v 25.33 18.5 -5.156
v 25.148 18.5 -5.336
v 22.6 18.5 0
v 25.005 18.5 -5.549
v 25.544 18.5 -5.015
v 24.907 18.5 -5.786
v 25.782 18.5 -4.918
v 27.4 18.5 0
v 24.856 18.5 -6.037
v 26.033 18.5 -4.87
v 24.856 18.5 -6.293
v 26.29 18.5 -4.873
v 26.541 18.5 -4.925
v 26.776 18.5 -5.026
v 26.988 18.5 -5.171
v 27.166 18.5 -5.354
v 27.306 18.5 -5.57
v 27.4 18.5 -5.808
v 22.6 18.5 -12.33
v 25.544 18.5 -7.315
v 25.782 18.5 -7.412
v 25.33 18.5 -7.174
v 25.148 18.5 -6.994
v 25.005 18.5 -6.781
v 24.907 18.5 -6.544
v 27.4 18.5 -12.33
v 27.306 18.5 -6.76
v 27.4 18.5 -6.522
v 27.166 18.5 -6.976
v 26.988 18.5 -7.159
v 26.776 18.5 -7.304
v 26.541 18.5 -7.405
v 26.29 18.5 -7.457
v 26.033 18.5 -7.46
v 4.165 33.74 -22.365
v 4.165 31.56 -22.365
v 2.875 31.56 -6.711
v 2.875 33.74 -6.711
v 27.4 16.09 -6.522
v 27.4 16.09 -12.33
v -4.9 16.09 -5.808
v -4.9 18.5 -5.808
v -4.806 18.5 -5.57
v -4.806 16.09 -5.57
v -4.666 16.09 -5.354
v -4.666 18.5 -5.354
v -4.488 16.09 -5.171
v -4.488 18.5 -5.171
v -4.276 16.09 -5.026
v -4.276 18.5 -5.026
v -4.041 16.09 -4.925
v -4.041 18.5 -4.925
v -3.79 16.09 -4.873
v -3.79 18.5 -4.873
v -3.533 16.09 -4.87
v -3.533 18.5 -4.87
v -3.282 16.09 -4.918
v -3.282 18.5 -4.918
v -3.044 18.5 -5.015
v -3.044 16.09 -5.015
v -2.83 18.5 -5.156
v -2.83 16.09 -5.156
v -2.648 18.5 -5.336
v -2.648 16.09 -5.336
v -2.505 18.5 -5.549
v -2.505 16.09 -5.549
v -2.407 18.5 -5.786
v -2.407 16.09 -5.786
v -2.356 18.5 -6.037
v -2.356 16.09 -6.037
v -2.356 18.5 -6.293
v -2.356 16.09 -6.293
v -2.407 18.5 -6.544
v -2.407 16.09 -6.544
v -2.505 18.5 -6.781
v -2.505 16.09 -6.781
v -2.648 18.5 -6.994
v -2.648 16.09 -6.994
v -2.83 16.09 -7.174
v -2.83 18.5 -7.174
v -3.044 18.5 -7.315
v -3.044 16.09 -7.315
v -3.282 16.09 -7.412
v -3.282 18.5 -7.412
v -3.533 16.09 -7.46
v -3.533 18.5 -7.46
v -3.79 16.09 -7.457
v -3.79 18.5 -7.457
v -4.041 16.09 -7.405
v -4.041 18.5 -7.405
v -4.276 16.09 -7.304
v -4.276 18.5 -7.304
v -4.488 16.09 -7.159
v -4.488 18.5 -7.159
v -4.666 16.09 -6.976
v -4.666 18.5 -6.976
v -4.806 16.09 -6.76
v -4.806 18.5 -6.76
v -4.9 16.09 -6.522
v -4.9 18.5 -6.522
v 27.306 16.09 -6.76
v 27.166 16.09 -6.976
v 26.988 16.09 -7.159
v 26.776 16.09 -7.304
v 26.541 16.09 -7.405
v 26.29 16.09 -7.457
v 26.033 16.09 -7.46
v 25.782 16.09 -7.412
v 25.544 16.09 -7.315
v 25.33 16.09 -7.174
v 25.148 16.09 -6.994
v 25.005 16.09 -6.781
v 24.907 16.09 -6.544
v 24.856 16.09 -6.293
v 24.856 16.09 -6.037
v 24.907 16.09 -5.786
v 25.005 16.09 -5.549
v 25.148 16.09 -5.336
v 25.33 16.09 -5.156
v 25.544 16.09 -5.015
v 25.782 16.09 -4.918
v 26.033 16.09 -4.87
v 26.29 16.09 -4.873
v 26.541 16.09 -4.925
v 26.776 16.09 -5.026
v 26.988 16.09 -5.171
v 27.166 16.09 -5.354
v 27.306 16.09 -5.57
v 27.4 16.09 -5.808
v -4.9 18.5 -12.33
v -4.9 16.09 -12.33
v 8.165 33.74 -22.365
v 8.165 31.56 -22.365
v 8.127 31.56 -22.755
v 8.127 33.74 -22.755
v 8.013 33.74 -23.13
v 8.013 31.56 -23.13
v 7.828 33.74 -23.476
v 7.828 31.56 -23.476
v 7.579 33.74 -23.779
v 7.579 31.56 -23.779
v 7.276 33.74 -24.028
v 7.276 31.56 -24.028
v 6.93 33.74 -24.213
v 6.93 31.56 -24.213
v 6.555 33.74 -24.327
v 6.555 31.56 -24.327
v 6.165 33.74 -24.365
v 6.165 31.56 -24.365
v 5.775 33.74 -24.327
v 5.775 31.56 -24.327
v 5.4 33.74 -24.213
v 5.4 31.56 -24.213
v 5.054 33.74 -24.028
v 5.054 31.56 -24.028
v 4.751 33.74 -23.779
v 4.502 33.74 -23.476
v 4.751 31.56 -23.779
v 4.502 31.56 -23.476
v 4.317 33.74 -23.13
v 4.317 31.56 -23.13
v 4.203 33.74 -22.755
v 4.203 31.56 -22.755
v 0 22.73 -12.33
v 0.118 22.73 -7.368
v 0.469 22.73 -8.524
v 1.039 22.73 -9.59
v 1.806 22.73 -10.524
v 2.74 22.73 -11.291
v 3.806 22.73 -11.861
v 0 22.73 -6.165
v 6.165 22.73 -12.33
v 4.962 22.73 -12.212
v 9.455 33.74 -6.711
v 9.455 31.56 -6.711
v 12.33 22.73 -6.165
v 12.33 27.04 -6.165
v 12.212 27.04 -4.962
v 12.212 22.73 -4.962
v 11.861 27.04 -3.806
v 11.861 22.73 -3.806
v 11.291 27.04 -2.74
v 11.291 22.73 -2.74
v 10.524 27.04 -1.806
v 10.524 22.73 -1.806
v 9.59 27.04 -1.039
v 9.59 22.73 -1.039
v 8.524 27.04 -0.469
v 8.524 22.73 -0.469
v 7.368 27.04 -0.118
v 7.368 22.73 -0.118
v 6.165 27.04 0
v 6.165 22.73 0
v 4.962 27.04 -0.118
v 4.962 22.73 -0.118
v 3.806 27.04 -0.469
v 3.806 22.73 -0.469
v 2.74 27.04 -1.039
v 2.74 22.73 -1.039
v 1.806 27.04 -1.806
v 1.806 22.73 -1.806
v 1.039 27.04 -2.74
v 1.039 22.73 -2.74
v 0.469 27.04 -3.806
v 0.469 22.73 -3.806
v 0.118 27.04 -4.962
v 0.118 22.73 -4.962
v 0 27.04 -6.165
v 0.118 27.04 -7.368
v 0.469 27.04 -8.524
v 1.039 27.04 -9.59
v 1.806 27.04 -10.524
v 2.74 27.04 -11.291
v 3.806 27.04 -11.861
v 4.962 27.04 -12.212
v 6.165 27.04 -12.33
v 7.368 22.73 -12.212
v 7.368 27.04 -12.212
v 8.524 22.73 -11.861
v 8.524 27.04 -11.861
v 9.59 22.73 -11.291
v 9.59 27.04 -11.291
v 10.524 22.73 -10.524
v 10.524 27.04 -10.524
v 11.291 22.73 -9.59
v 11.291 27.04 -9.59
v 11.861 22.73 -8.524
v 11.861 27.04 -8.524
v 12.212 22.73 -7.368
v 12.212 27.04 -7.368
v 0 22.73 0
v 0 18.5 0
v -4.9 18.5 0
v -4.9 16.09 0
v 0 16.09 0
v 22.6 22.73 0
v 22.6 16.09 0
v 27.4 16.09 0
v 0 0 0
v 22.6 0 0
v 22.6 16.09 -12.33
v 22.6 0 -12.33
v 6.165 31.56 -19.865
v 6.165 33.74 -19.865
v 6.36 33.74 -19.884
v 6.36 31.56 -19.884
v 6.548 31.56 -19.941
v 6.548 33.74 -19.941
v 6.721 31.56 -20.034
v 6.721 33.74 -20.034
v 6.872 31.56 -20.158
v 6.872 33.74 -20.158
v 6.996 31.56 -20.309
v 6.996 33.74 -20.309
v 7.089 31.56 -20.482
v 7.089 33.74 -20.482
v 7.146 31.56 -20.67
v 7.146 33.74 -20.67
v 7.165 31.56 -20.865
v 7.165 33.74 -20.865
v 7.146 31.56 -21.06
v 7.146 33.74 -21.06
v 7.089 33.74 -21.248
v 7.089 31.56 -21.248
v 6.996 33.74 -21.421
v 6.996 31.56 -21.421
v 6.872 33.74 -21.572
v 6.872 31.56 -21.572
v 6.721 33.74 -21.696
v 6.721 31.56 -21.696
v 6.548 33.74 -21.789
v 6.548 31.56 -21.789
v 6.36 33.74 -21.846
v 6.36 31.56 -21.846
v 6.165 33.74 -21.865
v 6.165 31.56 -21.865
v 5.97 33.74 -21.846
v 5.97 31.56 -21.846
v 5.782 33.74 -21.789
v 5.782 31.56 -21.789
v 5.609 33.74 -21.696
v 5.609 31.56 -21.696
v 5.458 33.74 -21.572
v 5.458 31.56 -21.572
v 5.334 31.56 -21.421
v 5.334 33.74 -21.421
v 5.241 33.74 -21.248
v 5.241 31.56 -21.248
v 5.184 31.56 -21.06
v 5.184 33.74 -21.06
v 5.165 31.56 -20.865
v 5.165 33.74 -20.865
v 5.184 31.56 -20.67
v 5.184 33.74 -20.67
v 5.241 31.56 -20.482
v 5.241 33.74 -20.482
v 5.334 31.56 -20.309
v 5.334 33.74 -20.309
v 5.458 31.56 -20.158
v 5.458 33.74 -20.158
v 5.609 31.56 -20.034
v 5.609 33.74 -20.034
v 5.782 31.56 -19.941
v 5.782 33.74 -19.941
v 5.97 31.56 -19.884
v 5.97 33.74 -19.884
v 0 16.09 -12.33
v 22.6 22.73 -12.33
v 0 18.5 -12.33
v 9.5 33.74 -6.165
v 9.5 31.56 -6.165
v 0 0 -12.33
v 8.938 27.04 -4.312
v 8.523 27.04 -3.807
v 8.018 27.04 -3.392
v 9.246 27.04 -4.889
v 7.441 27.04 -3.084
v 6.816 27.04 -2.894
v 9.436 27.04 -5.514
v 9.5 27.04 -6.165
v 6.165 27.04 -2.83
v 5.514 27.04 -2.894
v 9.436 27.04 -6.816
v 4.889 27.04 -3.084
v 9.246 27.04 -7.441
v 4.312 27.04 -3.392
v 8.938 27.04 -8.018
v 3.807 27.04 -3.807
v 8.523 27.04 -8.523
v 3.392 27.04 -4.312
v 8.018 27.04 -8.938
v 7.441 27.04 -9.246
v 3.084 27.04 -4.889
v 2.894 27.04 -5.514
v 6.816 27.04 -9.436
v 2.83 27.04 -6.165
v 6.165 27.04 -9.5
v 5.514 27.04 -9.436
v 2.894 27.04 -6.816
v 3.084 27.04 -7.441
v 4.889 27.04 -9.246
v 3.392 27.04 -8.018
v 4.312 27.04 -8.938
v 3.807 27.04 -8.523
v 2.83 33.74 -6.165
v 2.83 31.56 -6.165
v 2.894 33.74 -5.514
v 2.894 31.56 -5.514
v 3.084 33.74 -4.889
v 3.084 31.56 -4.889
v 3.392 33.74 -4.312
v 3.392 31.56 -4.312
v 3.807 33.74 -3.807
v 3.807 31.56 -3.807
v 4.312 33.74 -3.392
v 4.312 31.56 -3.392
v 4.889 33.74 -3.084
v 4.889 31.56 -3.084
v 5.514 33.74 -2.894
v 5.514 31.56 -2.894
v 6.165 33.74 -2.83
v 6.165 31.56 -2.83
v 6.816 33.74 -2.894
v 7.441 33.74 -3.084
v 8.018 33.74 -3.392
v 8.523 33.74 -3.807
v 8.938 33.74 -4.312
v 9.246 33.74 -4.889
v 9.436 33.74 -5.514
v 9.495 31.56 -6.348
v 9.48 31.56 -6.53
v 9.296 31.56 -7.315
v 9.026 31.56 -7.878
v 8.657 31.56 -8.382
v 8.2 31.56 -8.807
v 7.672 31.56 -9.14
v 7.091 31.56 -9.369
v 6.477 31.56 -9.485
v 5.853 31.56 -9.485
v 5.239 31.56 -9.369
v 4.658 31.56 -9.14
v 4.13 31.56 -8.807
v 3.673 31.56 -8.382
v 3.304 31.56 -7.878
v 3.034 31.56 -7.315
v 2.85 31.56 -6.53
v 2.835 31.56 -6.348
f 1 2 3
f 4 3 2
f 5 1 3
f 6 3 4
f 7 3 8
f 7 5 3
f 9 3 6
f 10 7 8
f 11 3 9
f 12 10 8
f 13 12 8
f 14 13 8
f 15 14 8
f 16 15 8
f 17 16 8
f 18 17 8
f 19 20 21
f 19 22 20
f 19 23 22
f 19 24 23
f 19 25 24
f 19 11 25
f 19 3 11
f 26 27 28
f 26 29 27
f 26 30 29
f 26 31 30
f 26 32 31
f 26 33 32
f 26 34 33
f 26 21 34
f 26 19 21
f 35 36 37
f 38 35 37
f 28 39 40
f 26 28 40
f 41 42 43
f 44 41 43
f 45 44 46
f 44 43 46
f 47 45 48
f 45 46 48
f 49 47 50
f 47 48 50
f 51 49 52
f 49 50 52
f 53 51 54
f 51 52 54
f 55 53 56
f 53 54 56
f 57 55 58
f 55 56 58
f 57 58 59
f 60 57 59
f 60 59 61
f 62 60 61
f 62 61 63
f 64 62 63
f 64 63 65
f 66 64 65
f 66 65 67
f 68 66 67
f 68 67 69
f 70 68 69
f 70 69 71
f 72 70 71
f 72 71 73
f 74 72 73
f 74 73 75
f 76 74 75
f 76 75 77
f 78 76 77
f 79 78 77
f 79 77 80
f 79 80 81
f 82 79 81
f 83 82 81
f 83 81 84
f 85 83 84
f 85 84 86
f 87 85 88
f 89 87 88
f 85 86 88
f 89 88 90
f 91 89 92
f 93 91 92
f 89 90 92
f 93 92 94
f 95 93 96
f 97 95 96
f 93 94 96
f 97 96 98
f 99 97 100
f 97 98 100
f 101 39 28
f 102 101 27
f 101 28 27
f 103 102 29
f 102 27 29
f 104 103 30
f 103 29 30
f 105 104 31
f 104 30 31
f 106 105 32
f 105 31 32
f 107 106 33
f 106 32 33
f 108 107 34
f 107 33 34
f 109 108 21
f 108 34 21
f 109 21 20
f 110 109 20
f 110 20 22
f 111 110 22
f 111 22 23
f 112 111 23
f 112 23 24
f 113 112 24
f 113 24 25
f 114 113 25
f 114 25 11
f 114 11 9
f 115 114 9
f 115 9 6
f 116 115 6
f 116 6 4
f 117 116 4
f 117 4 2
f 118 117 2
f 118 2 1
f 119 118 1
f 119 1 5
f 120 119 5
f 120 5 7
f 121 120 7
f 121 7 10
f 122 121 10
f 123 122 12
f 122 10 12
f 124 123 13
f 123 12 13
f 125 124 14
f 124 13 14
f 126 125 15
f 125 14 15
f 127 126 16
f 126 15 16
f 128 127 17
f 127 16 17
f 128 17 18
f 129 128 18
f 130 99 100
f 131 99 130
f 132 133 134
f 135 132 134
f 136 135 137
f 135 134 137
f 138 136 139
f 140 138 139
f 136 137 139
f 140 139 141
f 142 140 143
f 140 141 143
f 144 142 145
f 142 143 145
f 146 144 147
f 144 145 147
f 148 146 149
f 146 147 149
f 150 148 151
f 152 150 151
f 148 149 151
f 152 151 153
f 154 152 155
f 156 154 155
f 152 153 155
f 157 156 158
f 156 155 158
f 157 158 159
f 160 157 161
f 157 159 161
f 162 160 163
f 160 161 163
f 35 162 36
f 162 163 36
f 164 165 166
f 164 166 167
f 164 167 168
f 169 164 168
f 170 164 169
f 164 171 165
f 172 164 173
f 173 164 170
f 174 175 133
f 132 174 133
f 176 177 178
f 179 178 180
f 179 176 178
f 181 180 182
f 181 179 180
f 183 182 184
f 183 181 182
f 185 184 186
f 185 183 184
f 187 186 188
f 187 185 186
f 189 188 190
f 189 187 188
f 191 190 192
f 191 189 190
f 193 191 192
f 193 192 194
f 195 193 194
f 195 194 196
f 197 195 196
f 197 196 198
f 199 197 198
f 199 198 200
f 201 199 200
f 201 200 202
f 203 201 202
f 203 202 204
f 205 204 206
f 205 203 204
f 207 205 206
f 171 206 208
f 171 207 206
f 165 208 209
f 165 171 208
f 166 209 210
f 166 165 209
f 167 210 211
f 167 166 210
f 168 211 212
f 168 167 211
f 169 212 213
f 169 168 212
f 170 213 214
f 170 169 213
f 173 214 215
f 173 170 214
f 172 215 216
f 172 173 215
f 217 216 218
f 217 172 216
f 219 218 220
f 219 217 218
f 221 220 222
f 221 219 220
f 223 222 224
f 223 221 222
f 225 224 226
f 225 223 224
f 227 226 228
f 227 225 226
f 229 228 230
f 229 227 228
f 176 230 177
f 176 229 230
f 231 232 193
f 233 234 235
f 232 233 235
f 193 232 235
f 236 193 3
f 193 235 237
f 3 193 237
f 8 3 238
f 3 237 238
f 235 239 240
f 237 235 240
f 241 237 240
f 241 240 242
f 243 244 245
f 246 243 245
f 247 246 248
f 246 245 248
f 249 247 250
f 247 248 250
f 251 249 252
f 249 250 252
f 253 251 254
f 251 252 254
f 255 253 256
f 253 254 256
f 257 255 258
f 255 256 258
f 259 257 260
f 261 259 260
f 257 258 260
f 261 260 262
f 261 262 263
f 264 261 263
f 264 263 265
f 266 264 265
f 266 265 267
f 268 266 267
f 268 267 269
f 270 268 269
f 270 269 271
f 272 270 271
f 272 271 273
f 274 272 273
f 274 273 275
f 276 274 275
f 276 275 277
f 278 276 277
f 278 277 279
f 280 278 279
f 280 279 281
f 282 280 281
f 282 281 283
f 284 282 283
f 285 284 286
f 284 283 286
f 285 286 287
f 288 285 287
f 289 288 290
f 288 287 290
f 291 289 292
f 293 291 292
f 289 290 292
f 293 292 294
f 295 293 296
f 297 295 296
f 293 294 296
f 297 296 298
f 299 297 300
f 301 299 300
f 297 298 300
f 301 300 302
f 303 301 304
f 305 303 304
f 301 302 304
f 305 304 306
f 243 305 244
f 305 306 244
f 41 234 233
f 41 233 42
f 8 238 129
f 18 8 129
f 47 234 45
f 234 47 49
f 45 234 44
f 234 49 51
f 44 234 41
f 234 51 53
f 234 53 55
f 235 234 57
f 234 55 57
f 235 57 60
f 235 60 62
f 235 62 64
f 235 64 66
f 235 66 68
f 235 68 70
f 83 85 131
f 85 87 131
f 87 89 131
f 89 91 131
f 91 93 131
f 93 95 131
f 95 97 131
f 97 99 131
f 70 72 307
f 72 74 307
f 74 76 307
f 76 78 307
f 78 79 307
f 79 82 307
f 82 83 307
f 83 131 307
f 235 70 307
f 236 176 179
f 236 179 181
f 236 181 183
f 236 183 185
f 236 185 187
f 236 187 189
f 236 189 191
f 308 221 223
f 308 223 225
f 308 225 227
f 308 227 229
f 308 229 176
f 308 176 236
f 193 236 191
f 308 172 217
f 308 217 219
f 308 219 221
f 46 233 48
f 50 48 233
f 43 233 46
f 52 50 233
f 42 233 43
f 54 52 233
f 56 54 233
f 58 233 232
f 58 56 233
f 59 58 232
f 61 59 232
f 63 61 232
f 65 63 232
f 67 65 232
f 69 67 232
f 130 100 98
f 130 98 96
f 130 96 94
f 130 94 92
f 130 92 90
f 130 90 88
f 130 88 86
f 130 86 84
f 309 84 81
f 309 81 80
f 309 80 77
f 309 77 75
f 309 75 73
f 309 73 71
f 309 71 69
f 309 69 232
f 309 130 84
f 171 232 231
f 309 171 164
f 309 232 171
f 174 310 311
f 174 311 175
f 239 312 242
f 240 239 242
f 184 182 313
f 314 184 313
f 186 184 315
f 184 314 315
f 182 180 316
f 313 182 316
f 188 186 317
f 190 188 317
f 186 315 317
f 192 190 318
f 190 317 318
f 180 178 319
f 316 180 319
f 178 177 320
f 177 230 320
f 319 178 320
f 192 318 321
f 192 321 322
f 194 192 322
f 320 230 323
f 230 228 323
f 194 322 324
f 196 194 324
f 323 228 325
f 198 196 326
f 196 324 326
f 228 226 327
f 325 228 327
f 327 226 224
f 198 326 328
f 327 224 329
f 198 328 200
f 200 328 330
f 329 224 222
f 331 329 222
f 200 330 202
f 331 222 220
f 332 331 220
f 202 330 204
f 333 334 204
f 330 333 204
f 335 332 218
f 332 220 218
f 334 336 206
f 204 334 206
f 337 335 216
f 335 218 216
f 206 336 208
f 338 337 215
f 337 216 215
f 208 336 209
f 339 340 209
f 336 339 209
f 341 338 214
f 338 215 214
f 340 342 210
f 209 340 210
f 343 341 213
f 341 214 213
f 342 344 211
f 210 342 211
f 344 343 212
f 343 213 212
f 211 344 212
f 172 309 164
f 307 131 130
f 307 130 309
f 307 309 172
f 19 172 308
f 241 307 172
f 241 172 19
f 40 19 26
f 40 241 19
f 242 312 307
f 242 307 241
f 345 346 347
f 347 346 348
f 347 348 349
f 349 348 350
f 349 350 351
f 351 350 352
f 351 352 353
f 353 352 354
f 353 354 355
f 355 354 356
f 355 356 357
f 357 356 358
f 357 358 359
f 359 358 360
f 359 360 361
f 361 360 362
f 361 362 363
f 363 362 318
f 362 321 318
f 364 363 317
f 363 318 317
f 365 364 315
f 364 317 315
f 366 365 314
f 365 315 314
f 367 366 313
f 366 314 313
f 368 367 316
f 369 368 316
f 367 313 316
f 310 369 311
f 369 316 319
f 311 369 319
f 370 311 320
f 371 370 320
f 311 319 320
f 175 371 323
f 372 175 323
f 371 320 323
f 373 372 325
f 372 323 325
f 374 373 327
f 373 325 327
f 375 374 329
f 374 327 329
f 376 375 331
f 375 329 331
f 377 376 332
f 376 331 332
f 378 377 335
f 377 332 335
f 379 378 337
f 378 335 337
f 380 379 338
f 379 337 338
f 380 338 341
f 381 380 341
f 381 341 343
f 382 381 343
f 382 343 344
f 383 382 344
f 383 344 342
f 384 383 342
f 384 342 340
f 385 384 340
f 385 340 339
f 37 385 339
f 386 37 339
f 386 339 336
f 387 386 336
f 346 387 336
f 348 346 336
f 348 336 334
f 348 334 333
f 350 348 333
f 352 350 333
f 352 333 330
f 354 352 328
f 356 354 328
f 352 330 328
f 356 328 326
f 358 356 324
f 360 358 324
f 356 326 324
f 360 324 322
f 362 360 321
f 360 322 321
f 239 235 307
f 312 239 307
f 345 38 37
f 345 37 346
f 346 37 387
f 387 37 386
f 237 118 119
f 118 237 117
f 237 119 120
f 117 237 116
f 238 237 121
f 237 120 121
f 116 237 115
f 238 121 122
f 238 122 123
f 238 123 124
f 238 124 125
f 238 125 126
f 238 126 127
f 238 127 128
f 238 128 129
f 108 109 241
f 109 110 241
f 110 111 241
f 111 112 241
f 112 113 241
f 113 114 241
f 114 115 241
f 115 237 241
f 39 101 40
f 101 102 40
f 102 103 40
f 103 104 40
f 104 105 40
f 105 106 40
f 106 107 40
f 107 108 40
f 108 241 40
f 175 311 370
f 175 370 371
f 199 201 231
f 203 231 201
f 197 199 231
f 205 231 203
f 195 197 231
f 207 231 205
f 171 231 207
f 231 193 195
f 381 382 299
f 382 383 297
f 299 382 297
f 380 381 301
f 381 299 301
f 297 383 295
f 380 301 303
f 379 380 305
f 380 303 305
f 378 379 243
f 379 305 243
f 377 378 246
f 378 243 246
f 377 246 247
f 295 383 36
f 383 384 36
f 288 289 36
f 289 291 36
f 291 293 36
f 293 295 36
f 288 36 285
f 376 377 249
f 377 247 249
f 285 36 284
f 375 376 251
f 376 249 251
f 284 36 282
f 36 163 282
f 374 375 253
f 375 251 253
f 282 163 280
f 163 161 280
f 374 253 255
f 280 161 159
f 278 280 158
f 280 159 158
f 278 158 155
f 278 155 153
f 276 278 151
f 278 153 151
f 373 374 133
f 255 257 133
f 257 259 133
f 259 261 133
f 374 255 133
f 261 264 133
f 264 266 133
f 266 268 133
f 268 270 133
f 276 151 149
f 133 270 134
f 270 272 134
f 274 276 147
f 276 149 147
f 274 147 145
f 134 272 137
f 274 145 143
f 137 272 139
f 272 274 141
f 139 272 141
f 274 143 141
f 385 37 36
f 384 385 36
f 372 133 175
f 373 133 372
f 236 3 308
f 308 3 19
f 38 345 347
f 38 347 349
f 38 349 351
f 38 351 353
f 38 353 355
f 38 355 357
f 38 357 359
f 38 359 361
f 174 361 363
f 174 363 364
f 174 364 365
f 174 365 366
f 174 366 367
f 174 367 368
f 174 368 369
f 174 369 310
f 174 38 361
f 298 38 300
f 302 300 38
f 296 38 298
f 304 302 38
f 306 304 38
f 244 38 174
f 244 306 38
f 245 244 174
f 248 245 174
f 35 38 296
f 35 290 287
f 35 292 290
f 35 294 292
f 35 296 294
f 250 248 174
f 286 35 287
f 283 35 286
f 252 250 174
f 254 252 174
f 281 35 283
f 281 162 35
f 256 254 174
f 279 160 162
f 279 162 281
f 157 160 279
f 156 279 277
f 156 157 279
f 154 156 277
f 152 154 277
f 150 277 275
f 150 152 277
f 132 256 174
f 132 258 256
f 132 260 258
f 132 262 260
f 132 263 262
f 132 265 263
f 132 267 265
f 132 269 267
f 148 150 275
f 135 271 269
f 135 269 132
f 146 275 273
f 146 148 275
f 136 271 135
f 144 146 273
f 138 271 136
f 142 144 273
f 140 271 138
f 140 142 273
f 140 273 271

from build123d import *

# Parameters (mm, degrees)
SKETCH1_W           = 22.6
SKETCH1_H           = 12.33
BOSS_EXTRUDE1_DEPTH = 16.09
SKETCH2_W           = 32.3
SKETCH2_H           = 12.33
BOSS_EXTRUDE2_DEPTH = 2.41
SKETCH3_W           = 22.6
SKETCH3_H           = 12.33
BOSS_EXTRUDE3_DEPTH = 4.23
BOSS_EXTRUDE4_DEPTH = 4.31
SKETCH5_R           = 3.335
BOSS_EXTRUDE5_DEPTH = 4.52
BOSS_EXTRUDE8_DEPTH = 2.18
SKETCH8_R           = 1.3
CUT_EXTRUDE3_DEPTH  = 4
SKETCH9_R           = 1.3
CUT_EXTRUDE4_DEPTH  = 4
SKETCH10_R          = 1
CUT_EXTRUDE5_DEPTH  = 10


with BuildPart() as part:
    # Sketch1 → Boss-Extrude1 (new body)
    with BuildSketch(Plane(origin=(0, 0, 0), x_dir=(1, 0, 0), z_dir=(0, 1, 0))):
        with Locations((11.3, 6.165)):
            Rectangle(SKETCH1_W, SKETCH1_H)
    extrude(amount=BOSS_EXTRUDE1_DEPTH)

    # Sketch2 → Boss-Extrude2 (add)
    with BuildSketch(Plane(origin=(0, 16.09, 0), x_dir=(1, 0, 0), z_dir=(0, 1, 0))):
        with Locations((11.25, 6.165)):
            Rectangle(SKETCH2_W, SKETCH2_H)
    extrude(amount=BOSS_EXTRUDE2_DEPTH)

    # Sketch3 → Boss-Extrude3 (add)
    with BuildSketch(Plane(origin=(0, 18.5, 0), x_dir=(1, 0, 0), z_dir=(0, 1, 0))):
        with Locations((11.3, 6.165)):
            Rectangle(SKETCH3_W, SKETCH3_H)
    extrude(amount=BOSS_EXTRUDE3_DEPTH)

    # Sketch4 → Boss-Extrude4 (add)
    with BuildSketch(Plane(origin=(0, 22.73, 0), x_dir=(1, 0, 0), z_dir=(0, 1, 0))):
        with BuildLine():
            ThreePointArc((0, 6.165), (6.165, 12.33), (12.33, 6.165))
            ThreePointArc((12.33, 6.165), (6.165, 0), (0, 6.165))
        make_face()
    extrude(amount=BOSS_EXTRUDE4_DEPTH)

    # Sketch5 → Boss-Extrude5 (add)
    with BuildSketch(Plane(origin=(0, 27.04, 0), x_dir=(1, 0, 0), z_dir=(0, 1, 0))):
        with Locations(Location((6.165, 6.165, 0), (0, 0, 270))):
            Circle(SKETCH5_R)
    extrude(amount=BOSS_EXTRUDE5_DEPTH)

    # Sketch6 → Boss-Extrude8 (add)
    with BuildSketch(Plane(origin=(0, 31.56, 0), x_dir=(1, 0, 0), z_dir=(0, 1, 0))):
        with BuildLine():
            ThreePointArc((9.455009686, 6.710949872), (6.165, 9.5), (2.874990314, 6.710949872))
            Line((2.874990314, 6.710949872), (2.83, 6.165))
            ThreePointArc((2.83, 6.165), (6.165, 2.83), (9.5, 6.165))
            Line((9.5, 6.165), (9.455009686, 6.710949872))
        make_face()
        with BuildLine():
            ThreePointArc((8.165, 22.365), (6.165, 24.365), (4.165, 22.365))
            Line((4.165, 22.365), (2.874990314, 6.710949872))
            ThreePointArc((2.874990314, 6.710949872), (6.165, 9.5), (9.455009686, 6.710949872))
            Line((9.455009686, 6.710949872), (8.165, 22.365))
        make_face()
    extrude(amount=BOSS_EXTRUDE8_DEPTH)

    # Sketch8 → Cut-Extrude3 (cut)
    with BuildSketch(Plane(origin=(0, 18.5, 0), x_dir=(1, 0, 0), z_dir=(0, 1, 0))):
        with Locations((-3.65, 6.165)):
            Circle(SKETCH8_R)
    extrude(amount=-CUT_EXTRUDE3_DEPTH, mode=Mode.SUBTRACT)

    # Sketch9 → Cut-Extrude4 (cut)
    with BuildSketch(Plane(origin=(0, 18.5, 0), x_dir=(1, 0, 0), z_dir=(0, 1, 0))):
        with Locations((26.15, 6.165)):
            Circle(SKETCH9_R)
    extrude(amount=-CUT_EXTRUDE4_DEPTH, mode=Mode.SUBTRACT)

    # Sketch10 → Cut-Extrude5 (cut)
    with BuildSketch(Plane(origin=(0, 33.74, 0), x_dir=(1, 0, 0), z_dir=(0, 1, 0))):
        with Locations(Location((6.165, 20.865, 0), (0, 0, 270))):
            Circle(SKETCH10_R)
    extrude(amount=-CUT_EXTRUDE5_DEPTH, mode=Mode.SUBTRACT)


solid = part.part
